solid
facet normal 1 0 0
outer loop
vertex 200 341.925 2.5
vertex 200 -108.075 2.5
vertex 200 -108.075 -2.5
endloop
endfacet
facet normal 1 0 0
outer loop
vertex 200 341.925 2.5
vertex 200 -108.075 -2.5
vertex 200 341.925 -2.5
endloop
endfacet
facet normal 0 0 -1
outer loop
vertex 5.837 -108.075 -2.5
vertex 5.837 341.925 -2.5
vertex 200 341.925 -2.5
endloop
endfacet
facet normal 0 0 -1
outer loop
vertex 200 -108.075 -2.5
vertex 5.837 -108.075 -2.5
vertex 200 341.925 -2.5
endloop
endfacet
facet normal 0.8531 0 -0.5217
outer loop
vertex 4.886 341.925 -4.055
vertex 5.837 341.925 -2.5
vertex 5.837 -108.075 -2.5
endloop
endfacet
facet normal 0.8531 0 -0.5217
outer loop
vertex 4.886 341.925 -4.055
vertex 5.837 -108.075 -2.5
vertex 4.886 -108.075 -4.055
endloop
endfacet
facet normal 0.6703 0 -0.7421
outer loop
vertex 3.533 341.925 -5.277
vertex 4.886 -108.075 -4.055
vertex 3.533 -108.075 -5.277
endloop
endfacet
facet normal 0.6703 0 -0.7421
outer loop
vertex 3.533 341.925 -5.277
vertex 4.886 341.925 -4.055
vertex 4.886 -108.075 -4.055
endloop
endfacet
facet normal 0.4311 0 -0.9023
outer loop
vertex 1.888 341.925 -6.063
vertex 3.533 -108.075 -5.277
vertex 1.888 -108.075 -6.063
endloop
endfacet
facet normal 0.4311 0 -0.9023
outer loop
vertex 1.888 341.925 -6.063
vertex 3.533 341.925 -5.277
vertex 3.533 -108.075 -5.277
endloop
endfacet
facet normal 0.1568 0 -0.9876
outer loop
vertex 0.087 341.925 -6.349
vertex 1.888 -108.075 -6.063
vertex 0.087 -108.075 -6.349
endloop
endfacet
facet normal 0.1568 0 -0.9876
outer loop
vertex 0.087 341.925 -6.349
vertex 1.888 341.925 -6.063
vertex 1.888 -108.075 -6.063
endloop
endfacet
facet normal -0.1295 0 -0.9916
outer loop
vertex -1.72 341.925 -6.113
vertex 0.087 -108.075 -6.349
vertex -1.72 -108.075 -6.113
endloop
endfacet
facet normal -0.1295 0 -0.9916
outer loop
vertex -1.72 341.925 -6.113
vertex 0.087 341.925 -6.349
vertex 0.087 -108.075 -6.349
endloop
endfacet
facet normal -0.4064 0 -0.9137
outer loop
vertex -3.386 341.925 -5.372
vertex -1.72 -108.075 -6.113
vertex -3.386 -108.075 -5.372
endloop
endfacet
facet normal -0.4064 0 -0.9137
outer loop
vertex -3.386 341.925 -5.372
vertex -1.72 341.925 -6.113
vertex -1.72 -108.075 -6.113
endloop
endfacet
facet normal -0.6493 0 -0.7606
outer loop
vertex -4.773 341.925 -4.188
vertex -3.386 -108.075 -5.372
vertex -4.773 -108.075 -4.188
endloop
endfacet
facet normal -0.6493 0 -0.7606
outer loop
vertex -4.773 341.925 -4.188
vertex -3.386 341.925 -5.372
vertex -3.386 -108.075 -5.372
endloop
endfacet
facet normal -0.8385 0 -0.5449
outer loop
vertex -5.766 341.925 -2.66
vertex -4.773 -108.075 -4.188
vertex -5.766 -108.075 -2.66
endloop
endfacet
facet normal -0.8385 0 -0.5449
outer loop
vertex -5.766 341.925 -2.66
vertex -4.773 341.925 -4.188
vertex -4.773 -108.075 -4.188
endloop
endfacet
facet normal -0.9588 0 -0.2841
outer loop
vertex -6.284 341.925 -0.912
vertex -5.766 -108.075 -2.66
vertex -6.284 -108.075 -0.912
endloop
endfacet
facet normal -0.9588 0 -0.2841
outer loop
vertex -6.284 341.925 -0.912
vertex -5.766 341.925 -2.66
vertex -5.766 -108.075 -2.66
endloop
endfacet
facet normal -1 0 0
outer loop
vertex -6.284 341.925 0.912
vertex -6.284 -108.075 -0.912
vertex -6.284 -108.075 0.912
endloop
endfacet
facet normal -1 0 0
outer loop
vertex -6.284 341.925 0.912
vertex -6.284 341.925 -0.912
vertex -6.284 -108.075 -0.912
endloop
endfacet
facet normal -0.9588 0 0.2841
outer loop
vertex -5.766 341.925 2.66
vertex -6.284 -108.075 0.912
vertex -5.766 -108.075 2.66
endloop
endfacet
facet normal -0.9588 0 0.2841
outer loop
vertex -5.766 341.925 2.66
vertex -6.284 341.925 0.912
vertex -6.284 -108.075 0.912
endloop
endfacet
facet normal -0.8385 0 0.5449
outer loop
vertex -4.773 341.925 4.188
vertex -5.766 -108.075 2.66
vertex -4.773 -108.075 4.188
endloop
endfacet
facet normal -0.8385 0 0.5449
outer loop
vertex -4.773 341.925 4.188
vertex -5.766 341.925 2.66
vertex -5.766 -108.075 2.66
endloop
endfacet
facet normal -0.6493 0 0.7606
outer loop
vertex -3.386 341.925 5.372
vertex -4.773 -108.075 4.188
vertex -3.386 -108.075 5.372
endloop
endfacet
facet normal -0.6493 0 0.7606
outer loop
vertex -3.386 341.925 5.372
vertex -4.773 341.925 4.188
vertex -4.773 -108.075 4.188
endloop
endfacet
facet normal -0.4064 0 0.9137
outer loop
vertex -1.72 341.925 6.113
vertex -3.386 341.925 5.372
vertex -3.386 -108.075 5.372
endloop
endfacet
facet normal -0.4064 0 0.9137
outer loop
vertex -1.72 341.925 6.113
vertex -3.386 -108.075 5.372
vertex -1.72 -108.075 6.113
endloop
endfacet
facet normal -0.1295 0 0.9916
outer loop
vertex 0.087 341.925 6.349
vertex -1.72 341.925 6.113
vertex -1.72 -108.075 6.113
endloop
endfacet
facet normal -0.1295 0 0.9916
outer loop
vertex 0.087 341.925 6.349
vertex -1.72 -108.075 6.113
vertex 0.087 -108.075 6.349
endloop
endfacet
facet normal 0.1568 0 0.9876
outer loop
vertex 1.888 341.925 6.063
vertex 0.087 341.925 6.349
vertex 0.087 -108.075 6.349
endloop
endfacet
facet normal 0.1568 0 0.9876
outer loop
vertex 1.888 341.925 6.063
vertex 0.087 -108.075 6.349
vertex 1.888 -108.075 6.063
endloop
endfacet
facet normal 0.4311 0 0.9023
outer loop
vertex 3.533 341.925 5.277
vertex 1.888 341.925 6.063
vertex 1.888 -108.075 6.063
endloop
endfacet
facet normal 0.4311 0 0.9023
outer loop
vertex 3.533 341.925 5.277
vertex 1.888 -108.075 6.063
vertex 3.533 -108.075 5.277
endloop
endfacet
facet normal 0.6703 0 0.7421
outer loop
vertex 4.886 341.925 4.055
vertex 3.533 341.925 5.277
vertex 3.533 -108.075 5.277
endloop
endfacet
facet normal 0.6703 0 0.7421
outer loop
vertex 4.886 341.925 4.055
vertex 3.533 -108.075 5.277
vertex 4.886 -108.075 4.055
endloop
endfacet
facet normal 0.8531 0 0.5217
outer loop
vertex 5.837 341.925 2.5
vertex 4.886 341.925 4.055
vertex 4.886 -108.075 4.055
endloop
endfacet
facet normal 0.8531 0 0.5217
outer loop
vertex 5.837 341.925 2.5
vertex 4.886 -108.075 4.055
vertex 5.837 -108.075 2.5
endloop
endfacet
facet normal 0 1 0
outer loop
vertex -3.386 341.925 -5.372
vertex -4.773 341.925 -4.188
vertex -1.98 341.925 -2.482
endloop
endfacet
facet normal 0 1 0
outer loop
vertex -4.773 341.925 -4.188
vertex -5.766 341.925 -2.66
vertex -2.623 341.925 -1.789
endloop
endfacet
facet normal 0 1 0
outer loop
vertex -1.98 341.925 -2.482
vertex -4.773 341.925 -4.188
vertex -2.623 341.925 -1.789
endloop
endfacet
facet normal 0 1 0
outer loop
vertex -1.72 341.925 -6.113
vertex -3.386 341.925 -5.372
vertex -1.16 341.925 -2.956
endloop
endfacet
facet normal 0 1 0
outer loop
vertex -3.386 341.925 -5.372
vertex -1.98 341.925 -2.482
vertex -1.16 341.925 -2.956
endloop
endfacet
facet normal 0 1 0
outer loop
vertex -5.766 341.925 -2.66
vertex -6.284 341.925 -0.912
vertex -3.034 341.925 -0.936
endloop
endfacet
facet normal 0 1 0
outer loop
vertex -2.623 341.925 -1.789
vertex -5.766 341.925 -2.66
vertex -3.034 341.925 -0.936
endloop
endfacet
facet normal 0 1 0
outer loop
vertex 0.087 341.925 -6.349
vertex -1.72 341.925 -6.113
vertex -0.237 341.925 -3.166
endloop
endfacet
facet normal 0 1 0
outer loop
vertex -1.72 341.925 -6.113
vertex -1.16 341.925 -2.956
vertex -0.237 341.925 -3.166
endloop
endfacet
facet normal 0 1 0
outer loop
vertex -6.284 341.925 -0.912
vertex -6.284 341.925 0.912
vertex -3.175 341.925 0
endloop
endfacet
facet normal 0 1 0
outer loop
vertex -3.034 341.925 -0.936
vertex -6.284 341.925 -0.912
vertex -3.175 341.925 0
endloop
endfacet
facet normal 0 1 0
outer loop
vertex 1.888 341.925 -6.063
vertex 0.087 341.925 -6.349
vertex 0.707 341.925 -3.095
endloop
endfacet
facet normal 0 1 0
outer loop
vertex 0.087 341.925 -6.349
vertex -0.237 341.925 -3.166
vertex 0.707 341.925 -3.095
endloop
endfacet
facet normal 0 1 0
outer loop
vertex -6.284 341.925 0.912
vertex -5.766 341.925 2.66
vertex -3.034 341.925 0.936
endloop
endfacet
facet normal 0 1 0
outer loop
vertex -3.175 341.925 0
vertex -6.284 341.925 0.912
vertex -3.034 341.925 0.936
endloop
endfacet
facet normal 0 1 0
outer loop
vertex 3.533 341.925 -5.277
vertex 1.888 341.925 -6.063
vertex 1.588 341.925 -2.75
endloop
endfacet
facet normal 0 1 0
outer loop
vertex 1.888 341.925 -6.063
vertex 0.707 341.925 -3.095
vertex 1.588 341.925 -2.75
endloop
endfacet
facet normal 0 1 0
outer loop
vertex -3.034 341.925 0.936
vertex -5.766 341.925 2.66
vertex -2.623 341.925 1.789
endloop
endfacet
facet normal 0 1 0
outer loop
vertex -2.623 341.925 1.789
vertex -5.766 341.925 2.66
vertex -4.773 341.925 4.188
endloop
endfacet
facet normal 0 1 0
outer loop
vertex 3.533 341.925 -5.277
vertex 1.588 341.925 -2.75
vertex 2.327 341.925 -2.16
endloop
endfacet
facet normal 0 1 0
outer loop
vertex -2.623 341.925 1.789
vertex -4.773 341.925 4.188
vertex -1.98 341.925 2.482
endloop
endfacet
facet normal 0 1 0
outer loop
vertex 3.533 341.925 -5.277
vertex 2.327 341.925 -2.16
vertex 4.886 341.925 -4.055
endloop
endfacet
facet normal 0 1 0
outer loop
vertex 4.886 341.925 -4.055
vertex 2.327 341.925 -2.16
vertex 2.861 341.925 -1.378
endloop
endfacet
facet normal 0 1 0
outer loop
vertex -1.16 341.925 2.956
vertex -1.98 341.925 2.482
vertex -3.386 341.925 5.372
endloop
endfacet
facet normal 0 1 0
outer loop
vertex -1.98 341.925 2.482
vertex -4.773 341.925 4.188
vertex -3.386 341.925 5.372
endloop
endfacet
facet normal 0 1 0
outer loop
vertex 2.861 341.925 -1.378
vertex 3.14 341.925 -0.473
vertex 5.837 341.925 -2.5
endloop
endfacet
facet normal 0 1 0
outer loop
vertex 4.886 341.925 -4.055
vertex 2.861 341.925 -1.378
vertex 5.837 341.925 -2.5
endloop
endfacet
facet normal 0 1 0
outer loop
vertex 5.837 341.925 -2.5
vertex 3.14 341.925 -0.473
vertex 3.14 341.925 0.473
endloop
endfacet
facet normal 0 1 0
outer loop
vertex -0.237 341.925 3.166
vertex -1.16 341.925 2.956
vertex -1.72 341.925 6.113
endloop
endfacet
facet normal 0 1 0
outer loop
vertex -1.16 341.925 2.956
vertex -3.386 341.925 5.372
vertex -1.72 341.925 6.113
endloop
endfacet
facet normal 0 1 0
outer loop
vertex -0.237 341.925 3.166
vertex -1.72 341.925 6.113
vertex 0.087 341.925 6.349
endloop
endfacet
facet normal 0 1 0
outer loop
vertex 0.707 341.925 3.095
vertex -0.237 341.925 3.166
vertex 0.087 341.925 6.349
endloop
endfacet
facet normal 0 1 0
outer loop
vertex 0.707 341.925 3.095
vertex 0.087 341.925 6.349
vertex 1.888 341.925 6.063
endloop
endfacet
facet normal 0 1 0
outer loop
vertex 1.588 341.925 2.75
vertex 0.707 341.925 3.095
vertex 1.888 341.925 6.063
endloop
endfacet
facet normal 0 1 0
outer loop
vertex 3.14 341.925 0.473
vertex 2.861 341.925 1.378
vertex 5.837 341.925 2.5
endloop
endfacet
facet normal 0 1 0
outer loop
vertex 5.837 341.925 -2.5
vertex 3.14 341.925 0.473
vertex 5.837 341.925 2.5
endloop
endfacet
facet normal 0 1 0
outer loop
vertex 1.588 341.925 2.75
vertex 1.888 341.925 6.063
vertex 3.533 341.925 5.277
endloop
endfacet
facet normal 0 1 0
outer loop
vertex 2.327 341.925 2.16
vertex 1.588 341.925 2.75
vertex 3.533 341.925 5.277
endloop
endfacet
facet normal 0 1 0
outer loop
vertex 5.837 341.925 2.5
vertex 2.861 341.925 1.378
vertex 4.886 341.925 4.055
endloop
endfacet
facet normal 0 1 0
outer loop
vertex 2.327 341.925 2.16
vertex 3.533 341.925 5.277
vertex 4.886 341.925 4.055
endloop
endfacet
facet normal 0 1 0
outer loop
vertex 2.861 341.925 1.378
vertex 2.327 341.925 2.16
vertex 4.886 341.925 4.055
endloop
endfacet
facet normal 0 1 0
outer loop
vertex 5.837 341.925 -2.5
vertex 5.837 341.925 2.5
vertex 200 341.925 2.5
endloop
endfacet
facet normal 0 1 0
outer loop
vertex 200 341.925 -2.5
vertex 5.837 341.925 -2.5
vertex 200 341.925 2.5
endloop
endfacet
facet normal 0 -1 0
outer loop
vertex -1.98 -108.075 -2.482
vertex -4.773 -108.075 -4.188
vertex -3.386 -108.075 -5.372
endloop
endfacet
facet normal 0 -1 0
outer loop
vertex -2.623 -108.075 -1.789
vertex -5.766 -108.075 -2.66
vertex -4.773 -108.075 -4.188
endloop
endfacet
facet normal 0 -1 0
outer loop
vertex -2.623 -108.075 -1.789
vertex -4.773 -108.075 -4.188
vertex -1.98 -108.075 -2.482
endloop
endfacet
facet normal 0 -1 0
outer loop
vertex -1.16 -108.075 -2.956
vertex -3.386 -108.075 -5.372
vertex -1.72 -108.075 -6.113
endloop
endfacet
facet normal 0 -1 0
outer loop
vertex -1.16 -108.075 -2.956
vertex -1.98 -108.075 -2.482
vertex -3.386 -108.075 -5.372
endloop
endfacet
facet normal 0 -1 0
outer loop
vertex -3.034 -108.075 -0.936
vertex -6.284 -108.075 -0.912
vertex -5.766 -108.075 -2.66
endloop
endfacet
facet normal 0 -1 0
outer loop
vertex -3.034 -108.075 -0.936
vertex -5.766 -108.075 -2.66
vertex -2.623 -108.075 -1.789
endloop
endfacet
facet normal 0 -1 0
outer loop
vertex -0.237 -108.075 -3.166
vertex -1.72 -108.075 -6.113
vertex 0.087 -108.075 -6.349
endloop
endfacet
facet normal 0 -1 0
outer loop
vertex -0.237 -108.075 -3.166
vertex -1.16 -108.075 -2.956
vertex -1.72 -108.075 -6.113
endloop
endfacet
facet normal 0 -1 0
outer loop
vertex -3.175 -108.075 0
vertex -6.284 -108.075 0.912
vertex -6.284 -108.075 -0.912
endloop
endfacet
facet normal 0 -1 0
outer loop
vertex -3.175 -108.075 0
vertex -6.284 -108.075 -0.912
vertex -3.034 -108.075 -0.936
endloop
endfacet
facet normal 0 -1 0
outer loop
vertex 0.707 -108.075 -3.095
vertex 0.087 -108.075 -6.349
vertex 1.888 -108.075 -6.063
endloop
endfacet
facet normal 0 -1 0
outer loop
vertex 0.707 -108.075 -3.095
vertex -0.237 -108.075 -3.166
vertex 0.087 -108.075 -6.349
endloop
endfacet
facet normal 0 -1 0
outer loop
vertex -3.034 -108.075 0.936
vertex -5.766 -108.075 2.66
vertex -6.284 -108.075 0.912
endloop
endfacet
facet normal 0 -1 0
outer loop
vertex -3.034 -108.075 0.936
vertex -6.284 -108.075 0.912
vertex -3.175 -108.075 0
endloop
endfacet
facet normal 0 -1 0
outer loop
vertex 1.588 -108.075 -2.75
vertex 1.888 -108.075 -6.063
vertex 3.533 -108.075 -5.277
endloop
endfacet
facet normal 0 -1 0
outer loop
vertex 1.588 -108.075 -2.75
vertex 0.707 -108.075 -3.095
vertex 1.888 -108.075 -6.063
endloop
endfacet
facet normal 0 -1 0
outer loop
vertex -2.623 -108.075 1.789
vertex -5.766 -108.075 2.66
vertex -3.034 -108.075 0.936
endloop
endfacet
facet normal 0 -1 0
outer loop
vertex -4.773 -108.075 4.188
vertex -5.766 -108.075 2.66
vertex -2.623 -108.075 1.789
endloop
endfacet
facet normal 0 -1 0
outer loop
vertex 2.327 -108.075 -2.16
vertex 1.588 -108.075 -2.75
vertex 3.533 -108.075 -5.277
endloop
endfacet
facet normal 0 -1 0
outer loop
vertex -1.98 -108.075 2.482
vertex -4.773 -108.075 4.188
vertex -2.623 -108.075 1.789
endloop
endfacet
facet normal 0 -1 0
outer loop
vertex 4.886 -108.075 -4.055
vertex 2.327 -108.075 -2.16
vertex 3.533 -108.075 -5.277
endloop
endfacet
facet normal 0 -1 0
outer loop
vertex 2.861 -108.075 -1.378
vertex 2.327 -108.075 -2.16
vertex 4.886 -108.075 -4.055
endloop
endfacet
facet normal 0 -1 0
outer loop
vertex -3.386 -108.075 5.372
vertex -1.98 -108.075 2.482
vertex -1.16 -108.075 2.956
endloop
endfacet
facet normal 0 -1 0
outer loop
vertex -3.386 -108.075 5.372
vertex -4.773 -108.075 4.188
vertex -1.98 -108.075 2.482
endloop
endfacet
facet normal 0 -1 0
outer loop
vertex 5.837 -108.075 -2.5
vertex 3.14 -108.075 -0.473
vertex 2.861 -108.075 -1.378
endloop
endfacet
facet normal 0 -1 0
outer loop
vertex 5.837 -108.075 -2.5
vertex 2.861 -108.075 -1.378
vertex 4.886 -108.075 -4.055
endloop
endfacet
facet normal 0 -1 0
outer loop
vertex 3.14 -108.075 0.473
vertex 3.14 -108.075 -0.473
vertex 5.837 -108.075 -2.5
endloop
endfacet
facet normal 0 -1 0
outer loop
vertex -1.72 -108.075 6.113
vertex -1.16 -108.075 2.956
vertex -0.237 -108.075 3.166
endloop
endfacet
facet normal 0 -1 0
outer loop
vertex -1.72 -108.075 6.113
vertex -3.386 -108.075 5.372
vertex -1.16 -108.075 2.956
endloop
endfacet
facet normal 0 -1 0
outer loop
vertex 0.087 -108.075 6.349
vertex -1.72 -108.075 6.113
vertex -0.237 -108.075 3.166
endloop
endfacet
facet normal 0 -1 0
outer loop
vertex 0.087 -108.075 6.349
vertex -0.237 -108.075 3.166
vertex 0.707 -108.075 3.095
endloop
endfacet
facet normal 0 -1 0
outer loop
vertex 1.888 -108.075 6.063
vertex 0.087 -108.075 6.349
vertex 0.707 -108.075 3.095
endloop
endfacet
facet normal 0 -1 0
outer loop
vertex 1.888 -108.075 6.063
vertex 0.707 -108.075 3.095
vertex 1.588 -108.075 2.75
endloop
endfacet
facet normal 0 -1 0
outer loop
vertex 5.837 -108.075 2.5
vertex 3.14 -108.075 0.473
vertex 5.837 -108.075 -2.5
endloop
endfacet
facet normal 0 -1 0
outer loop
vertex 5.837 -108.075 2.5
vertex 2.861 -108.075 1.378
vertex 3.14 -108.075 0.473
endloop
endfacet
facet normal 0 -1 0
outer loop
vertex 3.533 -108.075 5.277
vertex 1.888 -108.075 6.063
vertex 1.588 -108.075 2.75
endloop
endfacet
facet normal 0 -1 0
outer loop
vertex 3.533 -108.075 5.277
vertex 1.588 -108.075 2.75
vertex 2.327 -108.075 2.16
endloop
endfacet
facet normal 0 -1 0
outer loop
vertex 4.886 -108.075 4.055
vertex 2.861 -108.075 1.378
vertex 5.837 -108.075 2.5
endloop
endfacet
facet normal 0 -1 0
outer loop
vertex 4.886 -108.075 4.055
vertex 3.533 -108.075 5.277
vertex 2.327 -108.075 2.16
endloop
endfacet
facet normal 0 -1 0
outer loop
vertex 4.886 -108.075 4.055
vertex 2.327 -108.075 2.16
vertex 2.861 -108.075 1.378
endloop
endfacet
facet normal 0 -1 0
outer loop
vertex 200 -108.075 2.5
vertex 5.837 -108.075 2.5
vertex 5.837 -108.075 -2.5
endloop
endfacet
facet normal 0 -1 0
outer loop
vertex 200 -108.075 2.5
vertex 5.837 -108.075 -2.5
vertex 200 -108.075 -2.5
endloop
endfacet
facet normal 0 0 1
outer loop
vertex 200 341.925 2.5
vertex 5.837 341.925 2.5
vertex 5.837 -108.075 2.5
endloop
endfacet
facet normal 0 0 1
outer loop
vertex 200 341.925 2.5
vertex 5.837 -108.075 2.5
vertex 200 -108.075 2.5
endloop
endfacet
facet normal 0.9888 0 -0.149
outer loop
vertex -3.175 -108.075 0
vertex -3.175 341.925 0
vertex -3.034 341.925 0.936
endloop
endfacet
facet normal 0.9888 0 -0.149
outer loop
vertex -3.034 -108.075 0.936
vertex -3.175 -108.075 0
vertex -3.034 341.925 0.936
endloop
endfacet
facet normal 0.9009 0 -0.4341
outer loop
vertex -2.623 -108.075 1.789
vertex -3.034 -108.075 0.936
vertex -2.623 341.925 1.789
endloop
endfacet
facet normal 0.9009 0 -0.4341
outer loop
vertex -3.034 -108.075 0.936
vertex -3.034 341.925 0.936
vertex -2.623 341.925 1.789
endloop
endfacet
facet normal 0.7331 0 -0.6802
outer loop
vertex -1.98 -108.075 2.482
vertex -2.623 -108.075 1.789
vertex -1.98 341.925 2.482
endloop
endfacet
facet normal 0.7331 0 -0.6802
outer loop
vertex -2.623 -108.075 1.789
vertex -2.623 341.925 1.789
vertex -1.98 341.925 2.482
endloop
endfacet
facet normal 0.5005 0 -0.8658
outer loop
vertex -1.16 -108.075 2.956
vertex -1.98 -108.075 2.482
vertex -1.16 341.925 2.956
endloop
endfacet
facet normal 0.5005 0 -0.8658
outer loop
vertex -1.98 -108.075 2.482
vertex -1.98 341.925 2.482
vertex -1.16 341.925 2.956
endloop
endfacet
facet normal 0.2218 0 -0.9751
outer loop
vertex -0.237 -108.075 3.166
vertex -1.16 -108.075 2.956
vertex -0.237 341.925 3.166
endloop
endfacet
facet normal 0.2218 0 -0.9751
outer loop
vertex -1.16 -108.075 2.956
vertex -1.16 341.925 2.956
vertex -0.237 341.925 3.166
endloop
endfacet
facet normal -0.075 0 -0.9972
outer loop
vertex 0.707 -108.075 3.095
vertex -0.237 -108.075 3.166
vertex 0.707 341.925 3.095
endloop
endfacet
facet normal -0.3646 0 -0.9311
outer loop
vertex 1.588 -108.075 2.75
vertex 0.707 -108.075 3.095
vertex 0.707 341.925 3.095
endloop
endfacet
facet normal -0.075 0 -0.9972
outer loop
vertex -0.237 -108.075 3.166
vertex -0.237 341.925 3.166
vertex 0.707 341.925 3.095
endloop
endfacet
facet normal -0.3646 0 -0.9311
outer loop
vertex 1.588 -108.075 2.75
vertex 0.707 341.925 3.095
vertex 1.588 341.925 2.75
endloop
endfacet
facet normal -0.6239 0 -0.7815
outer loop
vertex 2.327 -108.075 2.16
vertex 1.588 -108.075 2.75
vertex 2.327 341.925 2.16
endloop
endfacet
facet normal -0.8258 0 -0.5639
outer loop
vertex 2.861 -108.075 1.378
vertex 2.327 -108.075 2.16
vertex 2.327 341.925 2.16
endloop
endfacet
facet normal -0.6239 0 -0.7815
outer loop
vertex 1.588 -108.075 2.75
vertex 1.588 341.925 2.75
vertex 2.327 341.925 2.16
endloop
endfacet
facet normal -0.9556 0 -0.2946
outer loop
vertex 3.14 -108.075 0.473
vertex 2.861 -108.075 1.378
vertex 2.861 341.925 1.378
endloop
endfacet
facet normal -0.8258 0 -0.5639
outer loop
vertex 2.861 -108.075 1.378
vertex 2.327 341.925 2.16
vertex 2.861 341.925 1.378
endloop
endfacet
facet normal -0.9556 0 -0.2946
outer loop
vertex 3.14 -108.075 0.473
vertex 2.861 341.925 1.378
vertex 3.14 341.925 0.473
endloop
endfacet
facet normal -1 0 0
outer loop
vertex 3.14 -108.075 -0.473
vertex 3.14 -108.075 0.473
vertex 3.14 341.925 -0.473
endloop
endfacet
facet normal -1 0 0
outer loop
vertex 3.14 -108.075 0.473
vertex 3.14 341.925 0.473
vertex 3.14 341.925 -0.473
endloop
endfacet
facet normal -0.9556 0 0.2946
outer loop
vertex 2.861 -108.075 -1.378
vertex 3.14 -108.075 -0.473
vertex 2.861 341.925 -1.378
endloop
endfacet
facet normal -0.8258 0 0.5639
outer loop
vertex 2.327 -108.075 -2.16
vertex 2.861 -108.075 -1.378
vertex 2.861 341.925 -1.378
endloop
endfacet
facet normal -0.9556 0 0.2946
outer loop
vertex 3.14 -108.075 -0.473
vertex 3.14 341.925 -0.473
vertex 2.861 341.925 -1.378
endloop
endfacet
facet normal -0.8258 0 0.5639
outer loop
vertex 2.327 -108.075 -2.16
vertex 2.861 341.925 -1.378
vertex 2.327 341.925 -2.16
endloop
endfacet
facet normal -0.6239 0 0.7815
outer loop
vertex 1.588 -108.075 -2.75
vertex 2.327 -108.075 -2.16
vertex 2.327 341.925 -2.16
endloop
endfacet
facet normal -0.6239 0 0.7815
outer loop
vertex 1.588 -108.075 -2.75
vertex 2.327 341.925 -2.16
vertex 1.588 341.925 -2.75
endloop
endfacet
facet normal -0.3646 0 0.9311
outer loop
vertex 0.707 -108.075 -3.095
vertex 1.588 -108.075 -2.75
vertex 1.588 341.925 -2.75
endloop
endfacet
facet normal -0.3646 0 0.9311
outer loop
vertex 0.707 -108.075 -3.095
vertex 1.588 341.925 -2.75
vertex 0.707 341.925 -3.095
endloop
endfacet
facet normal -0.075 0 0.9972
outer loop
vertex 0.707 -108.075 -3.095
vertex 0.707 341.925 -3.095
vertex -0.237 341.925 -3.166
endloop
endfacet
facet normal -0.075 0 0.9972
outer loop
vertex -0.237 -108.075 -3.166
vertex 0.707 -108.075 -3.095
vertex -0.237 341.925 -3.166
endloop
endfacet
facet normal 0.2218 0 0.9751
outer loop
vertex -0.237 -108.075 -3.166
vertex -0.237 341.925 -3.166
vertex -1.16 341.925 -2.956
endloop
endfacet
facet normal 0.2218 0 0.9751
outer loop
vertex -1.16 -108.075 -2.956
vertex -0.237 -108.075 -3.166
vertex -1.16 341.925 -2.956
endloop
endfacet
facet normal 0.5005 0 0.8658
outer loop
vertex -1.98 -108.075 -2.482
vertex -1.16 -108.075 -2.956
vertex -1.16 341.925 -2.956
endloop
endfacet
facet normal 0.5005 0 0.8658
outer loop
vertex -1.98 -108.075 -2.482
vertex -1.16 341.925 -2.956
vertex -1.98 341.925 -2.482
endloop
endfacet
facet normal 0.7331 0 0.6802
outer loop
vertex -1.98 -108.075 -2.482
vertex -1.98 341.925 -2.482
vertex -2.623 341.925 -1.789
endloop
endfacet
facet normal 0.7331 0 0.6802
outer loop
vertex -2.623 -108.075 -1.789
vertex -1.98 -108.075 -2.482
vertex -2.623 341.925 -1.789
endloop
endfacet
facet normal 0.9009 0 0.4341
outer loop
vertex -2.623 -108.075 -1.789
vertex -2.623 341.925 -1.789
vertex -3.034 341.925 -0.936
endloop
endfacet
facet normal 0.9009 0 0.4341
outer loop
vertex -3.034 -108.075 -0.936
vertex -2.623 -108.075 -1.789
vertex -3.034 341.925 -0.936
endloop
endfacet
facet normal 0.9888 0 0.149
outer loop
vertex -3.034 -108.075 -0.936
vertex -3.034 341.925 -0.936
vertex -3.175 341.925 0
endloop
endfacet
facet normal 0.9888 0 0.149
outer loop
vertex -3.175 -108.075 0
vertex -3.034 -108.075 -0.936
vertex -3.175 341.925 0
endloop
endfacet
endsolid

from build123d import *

# Parameters (mm, degrees)
SKETCH1_W                       = 200
SKETCH1_H                       = 450
BOSS_EXTRUDE1_DEPTH             = 2.5
BOSS_EXTRUDE2_REACH             = 398.13
SKETCH2_R                       = 6.35
BOSS_EXTRUDE2_DIRECTION_2_REACH = 398.13
SKETCH3_R                       = 3.175
CUT_EXTRUDE1_DEPTH              = 493.483829684


with BuildPart() as part:
    # Sketch1 → Boss-Extrude1 (new, symmetric)
    with BuildSketch(Plane.XY):
        with Locations((100, 116.925373314)):
            Rectangle(SKETCH1_W, SKETCH1_H)
    extrude(amount=BOSS_EXTRUDE1_DEPTH, both=True)

    # Boss-Extrude2: up to this face of the body (flat: up to its plane)
    boss_extrude2_end = Plane(part.part.faces().sort_by_distance((100, 341.925373314, 0))[0])
    # Sketch2 → Boss-Extrude2 (add, up to the picked face)
    with BuildSketch(Plane(origin=(0, 0, 0), x_dir=(1, 0, 0), z_dir=(0, 1, 0)), mode=Mode.PRIVATE) as boss_extrude2_sk1:
        Circle(SKETCH2_R)
    boss_extrude2_tool1 = split(extrude(boss_extrude2_sk1.sketch, amount=BOSS_EXTRUDE2_REACH, mode=Mode.PRIVATE), bisect_by=boss_extrude2_end, keep=Keep.BOTH, mode=Mode.PRIVATE)
    add(boss_extrude2_tool1.solids().sort_by(Axis((0, 0, 0), (0, 1, 0)))[0])

    # Boss-Extrude2 direction 2: up to this face of the body (flat: up to its plane)
    boss_extrude2_direction_2_end = Plane(part.part.faces().sort_by_distance((100, -108.074626686, 0))[0])
    # Sketch2 → Boss-Extrude2 direction 2 (add, up to the picked face)
    with BuildSketch(Plane(origin=(0, 0, 0), x_dir=(1, 0, 0), z_dir=(0, 1, 0)), mode=Mode.PRIVATE) as boss_extrude2_direction_2_sk1:
        Circle(SKETCH2_R)
    boss_extrude2_direction_2_tool1 = split(extrude(boss_extrude2_direction_2_sk1.sketch, amount=-BOSS_EXTRUDE2_DIRECTION_2_REACH, mode=Mode.PRIVATE), bisect_by=boss_extrude2_direction_2_end, keep=Keep.BOTH, mode=Mode.PRIVATE)
    add(boss_extrude2_direction_2_tool1.solids().sort_by(Axis((0, 0, 0), (0, -1, 0)))[0])

    # Sketch3 → Cut-Extrude1 (cut, through all)
    with BuildSketch(Plane(origin=(0, 341.925373314, 0), x_dir=(1, 0, 0), z_dir=(0, 1, 0))):
        with Locations(Location((0, 0, 0), (0, 0, 180))):
            Circle(SKETCH3_R)
    extrude(amount=-CUT_EXTRUDE1_DEPTH, mode=Mode.SUBTRACT)


solid = part.part
